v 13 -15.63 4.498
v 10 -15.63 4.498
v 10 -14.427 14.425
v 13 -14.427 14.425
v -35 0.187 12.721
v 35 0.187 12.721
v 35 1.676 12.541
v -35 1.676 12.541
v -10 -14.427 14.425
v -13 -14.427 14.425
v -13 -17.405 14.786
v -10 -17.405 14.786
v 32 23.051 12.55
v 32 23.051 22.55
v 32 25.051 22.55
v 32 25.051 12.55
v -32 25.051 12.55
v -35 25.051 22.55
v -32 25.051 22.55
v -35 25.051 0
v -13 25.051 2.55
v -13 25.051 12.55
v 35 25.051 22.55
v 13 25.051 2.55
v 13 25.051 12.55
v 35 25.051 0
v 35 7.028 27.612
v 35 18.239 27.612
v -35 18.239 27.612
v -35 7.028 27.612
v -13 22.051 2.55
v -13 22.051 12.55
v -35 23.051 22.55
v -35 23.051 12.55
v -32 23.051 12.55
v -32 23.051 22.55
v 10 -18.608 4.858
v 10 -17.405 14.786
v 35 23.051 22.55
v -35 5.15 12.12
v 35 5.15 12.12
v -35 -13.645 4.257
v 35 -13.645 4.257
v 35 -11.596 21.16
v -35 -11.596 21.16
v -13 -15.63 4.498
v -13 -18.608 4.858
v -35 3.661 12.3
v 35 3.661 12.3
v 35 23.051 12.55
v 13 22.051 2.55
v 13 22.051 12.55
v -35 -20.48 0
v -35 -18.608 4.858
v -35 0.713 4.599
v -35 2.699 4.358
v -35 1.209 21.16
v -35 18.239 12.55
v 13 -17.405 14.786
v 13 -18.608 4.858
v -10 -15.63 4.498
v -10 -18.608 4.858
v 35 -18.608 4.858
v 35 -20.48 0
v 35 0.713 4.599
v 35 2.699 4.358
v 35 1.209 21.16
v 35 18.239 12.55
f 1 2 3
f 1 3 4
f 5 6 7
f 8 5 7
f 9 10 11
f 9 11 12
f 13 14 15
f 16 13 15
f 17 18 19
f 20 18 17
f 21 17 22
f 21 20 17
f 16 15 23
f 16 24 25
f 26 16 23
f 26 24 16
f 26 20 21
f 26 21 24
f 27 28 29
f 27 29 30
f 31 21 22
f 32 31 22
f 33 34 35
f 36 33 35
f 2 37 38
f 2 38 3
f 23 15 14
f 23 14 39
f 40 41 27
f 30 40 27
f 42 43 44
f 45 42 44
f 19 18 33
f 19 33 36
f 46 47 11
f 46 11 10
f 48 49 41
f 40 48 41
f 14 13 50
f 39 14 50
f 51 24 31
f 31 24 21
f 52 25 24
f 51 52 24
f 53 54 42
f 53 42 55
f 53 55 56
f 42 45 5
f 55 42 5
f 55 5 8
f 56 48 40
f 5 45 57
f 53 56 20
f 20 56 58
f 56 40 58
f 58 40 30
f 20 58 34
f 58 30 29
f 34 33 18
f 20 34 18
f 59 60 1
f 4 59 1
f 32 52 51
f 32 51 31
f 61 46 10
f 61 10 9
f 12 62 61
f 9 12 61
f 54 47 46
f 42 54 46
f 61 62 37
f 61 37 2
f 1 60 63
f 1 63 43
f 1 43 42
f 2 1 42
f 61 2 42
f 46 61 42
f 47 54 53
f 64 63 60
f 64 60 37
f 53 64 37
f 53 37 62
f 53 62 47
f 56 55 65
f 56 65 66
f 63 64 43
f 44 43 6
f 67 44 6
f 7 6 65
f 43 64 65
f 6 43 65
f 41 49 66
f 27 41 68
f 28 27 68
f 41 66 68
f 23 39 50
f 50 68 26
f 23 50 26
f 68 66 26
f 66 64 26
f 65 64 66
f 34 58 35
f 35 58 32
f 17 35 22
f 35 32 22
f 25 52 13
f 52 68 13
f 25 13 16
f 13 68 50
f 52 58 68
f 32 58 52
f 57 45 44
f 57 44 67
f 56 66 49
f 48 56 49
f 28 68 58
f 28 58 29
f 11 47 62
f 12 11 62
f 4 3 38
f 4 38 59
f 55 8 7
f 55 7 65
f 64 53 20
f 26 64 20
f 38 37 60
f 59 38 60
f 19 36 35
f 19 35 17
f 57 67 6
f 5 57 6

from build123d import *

# Parameters (mm, degrees)
F1_DEPTH  = 35
F2_W      = 6.8124607205
F2_H      = 15.0619698688
F3_DEPTH  = 70
F5_DEPTH  = 70
F6_W      = 3
F6_H      = 3
F7_DEPTH  = 10
F8_W      = 3
F8_H      = 2
F9_DEPTH  = 10
F11_DEPTH = 3


with BuildPart() as f1:
    # F0 (on Right) → F1 (new body, symmetric)
    with BuildSketch(Plane.YZ):
        Polygon((-20.4803533852, 0), (0, 0), (25.0509791076, 0), (25.0509791076, 27.6123592876), (-9.8410505696, 27.6123592876), align=None)
    extrude(amount=F1_DEPTH, both=True)

    # F2 (on face) → F3 (cut, through all)
    with BuildSketch(Plane.YZ.offset(35)):
        Polygon((7.0281750523, 27.6123592876), (1.9915826587, 27.6123592876), (0.1867247932, 12.7213389033), (1.6758268317, 12.5408531167), (0.7132359701, 4.5989755784), (2.6987053547, 4.358327863), (3.6612962162, 12.3002054013), (5.1503982547, 12.1197196148), align=None)
        Polygon((-13.6446588918, 4.256867985), (-11.2603206785, 23.9289040036), (-18.6083323532, 4.8584872735), align=None)
        with Locations((21.6447487473, 20.0813743531)):
            Rectangle(F2_W, F2_H)
    extrude(amount=-F3_DEPTH, mode=Mode.SUBTRACT)

    # F4 (on face) → F5 (cut, through all)
    with BuildSketch(Plane.YZ.offset(35)):
        Polygon((-11.2603206785, 23.9289040036), (-11.5959745991, 21.1595837877), (1.2094775837, 21.1595837877), (1.9915826587, 27.6123592876), (-9.8410505696, 27.6123592876), align=None)
    extrude(amount=-F5_DEPTH, mode=Mode.SUBTRACT)

    # F6 (on face) → F7 (join)
    with BuildSketch(Plane(origin=(0, 0.3109364051, 2.5653877984), x_dir=(1, 0, 0), z_dir=(0, 0.1203238577, 0.9927346923))):
        with Locations((11.5, -17.557729024)):
            Rectangle(F6_W, F6_H)
        with Locations((-11.5, -17.557729024)):
            Rectangle(F6_W, F6_H)
    extrude(amount=F7_DEPTH)

    # F8 (on face) → F9 (join)
    with BuildSketch(Plane.XY.offset(12.5503894187)):
        with Locations((33.5, 24.0509791076)):
            Rectangle(F8_W, F8_H)
        with Locations((-33.5, 24.0509791076)):
            Rectangle(F8_W, F8_H)
    extrude(amount=F9_DEPTH)

    # F10 (on face) → F11 (cut)
    with BuildSketch(Plane(origin=(0, 25.0509791076, 0), x_dir=(-1, 0, 0), z_dir=(0, 1, 0))):
        Polygon((13, 12.5503894187), (0, 12.5503894187), (-13, 12.5503894187), (-13, 2.5503894187), (13, 2.5503894187), align=None)
    extrude(amount=-F11_DEPTH, mode=Mode.SUBTRACT)


solid = f1.part
